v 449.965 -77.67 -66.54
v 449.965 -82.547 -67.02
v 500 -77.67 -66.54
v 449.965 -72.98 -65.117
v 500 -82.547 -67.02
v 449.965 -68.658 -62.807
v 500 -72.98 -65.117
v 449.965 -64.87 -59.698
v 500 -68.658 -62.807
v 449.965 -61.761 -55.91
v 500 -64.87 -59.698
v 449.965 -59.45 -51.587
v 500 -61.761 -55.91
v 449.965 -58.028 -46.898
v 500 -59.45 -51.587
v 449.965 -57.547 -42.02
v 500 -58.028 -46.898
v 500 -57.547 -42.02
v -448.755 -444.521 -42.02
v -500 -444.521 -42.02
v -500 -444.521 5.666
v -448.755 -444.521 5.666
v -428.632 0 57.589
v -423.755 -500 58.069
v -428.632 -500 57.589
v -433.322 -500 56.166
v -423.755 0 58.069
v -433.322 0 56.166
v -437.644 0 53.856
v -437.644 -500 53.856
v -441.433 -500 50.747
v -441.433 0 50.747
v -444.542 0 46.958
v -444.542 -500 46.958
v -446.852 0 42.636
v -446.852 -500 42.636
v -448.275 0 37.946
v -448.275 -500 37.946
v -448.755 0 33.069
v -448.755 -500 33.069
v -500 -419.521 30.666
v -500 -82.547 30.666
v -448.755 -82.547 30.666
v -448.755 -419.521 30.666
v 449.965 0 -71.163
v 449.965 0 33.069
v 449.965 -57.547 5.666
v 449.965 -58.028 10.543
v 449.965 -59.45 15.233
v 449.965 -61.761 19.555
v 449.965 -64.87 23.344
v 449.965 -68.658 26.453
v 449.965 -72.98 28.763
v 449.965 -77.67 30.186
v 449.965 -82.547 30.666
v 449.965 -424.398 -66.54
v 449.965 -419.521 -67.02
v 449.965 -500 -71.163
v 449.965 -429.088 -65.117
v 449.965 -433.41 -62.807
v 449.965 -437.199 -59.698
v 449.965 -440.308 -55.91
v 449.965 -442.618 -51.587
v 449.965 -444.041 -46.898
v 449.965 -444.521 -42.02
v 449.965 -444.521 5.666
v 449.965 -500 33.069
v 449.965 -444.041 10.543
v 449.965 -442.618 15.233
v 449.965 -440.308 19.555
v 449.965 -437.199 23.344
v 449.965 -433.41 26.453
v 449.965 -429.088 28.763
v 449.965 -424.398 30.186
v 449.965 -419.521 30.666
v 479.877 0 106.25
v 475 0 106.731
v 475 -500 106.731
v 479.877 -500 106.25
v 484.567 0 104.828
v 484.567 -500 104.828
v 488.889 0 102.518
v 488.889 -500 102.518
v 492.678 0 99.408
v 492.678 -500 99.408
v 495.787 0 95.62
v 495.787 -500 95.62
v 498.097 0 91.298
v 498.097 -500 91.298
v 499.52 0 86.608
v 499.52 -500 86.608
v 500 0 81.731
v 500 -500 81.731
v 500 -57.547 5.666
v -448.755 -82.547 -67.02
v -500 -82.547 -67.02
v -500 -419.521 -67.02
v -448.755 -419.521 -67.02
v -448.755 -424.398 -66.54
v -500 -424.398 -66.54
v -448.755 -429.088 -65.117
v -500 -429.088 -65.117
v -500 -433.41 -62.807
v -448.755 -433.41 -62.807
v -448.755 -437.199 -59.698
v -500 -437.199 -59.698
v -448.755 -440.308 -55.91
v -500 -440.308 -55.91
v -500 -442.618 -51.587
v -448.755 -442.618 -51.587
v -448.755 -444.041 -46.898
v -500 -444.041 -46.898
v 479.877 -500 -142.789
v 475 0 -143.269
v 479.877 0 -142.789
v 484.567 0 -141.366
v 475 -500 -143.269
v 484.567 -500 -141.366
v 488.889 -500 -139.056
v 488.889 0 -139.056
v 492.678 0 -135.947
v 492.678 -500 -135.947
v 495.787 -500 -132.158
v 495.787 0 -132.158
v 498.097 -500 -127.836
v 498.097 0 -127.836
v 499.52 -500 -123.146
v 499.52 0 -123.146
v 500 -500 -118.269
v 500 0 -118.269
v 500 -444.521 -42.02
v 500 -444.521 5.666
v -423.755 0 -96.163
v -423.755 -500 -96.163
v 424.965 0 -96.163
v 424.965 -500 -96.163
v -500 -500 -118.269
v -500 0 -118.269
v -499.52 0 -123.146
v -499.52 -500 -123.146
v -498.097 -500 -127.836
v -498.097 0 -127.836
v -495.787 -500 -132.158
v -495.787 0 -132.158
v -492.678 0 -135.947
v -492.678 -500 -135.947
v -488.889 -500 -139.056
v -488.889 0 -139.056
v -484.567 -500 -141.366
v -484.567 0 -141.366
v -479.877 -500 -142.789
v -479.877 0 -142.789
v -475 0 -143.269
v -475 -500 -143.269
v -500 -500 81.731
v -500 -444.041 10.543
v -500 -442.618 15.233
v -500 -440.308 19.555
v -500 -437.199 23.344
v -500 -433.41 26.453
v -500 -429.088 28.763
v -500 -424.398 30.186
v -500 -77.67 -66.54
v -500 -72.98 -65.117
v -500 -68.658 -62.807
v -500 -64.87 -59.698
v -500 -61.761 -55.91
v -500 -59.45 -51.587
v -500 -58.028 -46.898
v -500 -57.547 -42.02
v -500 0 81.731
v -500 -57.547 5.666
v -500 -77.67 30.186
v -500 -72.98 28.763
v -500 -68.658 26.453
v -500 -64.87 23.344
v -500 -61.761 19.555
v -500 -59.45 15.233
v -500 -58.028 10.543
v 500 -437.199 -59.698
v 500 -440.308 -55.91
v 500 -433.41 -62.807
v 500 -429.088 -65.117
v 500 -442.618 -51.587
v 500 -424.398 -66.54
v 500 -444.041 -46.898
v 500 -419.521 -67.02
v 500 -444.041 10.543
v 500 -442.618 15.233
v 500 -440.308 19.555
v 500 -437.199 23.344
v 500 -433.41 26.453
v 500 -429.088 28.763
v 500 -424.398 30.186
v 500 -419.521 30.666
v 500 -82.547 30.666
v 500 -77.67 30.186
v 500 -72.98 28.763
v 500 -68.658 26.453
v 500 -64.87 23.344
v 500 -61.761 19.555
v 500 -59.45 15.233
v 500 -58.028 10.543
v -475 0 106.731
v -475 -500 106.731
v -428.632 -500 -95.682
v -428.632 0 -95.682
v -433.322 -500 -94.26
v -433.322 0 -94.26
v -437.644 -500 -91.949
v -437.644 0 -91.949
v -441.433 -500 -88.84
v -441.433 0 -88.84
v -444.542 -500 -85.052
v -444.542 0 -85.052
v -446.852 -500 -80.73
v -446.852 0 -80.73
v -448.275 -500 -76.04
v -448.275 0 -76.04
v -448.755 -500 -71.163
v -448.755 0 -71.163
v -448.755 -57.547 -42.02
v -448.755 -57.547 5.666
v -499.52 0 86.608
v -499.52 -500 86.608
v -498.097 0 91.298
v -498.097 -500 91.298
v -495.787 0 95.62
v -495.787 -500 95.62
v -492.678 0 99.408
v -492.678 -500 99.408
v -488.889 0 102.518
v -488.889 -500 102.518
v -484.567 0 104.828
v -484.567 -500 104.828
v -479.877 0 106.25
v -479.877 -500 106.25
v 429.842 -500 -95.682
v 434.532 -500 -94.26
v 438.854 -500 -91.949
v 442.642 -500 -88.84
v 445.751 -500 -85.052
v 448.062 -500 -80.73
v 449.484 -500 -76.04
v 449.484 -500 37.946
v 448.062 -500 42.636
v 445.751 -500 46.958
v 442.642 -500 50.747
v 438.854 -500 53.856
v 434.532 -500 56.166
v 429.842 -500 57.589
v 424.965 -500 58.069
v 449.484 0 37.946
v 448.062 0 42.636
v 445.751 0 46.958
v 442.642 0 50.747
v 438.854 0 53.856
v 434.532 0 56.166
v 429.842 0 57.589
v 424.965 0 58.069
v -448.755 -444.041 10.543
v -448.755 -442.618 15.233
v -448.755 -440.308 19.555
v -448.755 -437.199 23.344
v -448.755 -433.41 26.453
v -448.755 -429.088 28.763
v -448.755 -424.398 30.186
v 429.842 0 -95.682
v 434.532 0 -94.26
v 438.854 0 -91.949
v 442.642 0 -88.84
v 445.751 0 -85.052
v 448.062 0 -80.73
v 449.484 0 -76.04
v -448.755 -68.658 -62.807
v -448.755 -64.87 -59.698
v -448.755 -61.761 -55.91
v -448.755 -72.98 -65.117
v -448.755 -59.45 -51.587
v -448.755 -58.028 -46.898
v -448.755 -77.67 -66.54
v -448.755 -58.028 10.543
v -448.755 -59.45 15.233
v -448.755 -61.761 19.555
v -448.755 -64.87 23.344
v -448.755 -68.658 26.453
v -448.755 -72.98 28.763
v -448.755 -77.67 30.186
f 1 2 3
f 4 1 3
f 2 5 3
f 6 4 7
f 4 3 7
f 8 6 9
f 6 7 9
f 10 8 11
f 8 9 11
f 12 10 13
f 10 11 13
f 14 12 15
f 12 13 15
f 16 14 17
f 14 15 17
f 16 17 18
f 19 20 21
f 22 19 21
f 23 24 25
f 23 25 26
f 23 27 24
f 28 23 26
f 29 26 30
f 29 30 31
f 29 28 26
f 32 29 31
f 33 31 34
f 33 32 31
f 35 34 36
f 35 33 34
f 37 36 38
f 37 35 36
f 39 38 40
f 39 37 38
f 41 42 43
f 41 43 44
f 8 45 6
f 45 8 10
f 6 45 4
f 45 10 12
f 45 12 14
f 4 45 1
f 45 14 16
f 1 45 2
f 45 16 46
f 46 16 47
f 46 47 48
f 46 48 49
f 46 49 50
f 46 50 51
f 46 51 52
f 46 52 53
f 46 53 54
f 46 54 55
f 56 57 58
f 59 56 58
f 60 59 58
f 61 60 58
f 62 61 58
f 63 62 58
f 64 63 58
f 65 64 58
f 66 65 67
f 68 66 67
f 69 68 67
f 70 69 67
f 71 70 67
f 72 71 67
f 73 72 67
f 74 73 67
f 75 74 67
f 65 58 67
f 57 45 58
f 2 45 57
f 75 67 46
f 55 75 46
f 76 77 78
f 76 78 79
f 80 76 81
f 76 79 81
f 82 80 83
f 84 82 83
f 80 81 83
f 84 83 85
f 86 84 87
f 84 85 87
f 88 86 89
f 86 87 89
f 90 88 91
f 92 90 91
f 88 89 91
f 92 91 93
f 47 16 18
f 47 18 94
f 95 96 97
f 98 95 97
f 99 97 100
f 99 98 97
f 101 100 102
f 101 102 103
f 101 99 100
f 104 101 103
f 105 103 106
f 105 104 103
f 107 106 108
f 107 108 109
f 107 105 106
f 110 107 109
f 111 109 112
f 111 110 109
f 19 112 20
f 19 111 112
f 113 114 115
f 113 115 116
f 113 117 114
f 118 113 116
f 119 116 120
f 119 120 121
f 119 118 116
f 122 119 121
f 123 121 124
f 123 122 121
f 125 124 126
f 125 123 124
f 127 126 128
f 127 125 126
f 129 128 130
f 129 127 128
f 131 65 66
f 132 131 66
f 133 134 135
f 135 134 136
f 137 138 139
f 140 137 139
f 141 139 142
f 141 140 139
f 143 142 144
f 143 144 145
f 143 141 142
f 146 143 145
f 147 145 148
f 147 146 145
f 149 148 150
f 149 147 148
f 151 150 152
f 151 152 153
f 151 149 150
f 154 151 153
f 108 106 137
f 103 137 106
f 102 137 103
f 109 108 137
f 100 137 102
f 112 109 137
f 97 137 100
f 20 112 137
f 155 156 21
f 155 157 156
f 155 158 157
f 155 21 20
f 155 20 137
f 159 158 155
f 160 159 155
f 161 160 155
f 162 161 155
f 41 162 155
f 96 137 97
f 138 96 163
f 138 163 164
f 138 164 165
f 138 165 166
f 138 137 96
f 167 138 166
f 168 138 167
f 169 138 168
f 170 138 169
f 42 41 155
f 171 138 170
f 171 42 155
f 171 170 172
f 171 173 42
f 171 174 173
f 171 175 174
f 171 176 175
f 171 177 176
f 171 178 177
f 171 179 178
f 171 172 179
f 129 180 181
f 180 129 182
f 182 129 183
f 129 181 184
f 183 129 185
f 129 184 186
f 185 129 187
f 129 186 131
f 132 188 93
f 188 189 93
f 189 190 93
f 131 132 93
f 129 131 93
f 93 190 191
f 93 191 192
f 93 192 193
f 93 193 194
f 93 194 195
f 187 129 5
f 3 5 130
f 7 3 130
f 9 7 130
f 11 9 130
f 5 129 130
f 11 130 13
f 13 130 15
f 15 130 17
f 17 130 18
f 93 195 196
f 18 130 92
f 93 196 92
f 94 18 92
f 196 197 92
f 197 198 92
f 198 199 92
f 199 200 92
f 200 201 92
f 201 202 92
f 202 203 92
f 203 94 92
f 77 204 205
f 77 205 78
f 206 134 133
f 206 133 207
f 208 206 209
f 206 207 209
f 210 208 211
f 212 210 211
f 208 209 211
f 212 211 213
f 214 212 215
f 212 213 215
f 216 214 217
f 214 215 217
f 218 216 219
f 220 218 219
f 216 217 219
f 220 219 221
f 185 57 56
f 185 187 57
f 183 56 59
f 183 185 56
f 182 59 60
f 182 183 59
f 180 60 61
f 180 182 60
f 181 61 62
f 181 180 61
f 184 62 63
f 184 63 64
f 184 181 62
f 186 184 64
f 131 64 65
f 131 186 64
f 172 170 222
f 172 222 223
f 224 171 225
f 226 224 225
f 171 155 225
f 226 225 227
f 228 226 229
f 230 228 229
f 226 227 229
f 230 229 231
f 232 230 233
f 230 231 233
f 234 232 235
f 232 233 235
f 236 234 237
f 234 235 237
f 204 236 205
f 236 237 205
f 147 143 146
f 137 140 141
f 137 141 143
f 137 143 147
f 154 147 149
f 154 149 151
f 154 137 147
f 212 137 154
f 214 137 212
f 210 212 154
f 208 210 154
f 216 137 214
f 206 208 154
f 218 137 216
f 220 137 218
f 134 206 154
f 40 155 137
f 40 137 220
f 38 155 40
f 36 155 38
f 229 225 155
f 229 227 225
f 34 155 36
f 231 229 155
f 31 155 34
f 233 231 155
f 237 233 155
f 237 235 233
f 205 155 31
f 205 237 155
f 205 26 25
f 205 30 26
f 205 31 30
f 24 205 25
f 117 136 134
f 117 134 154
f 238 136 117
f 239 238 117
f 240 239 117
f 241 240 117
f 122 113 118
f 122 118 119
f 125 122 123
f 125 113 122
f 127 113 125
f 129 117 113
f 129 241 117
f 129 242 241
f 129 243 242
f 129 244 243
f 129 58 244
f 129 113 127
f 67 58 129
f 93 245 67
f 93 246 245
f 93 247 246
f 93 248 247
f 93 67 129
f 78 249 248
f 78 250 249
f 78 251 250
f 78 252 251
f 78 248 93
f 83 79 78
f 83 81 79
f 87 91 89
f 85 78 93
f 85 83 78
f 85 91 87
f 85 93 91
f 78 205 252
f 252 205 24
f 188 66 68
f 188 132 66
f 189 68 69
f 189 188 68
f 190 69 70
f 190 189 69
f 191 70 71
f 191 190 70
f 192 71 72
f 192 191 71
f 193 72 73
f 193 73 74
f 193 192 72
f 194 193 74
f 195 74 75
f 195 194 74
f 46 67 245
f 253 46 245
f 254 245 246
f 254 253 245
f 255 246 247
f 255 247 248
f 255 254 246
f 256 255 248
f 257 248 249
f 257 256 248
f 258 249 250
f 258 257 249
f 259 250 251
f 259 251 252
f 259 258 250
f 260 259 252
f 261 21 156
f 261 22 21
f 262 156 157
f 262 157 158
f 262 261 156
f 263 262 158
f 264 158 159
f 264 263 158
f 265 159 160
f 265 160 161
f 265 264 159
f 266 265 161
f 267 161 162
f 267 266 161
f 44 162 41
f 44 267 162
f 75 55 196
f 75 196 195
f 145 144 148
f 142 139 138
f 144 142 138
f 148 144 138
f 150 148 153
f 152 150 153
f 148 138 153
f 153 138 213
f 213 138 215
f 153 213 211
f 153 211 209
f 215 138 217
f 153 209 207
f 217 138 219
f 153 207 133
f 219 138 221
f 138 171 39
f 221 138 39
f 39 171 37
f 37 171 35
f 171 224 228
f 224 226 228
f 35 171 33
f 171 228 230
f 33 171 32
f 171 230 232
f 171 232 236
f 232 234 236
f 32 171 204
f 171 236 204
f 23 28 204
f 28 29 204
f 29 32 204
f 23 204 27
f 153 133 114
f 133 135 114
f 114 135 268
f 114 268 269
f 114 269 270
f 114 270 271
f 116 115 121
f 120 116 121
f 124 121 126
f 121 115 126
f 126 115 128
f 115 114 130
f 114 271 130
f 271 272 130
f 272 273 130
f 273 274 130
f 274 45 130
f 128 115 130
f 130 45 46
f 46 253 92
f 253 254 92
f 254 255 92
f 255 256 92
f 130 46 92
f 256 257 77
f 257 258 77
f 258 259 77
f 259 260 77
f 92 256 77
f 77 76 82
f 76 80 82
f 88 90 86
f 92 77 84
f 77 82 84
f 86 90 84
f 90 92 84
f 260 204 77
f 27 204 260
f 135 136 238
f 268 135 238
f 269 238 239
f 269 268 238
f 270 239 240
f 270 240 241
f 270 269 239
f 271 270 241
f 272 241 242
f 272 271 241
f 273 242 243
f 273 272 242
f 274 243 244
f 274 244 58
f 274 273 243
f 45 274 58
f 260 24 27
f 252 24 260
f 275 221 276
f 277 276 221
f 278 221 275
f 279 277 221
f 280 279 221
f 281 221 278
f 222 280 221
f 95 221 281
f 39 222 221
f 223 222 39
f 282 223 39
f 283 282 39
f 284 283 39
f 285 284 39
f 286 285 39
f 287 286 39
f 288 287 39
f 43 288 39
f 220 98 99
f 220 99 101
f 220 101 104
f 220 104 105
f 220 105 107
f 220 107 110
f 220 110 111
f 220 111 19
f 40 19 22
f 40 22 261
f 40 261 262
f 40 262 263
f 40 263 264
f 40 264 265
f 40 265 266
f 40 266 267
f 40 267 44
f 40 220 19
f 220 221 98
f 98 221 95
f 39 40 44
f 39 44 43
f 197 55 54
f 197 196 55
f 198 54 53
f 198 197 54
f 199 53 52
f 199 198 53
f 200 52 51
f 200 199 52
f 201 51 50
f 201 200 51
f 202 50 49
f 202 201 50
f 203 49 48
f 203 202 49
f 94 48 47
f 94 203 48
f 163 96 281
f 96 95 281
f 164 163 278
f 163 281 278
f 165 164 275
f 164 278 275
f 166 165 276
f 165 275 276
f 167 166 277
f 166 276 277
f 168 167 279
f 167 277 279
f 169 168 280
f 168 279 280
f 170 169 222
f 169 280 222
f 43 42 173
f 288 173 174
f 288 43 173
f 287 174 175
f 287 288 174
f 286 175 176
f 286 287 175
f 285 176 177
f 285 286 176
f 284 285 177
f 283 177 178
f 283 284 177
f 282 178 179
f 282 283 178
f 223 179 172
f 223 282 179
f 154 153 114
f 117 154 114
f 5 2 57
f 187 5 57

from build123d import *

# Parameters (mm, degrees)
F0_W     = 2000
F0_H     = 500
F1_DEPTH = 1000
F2_W     = 1797.4397540092
F2_H     = 308.4638491273
F3_DEPTH = 1000.001
F4_R     = 50
F5_W     = 773.9472016692
F5_H     = 195.3730471432
F6_DEPTH = 2000.001
F7_R     = 50
F8_SCALE = 0.5


with BuildPart() as f1:
    # F0 (on Front) → F1 (new body)
    with BuildSketch(Plane.XZ):
        with Locations((0, -36.5384618746)):
            Rectangle(F0_W, F0_H)
    extrude(amount=F1_DEPTH)

    # F2 (on face) → F3 (cut, through all)
    with BuildSketch(Plane.XZ.offset(1000)):
        with Locations((1.2095868587, -38.0935780704)):
            Rectangle(F2_W, F2_H)
    extrude(amount=-F3_DEPTH, mode=Mode.SUBTRACT)

    # F4
    f4_edges = [f1.edges().sort_by_distance(p)[0] for p in [
        (1000, -500, 213.461538),
        (1000, -500, -286.538462),
        (-1000, -500, 213.461538),
        (-1000, -500, -286.538462),
        (-897.51029, -500, 116.138346),
        (-897.51029, -500, -192.325503),
        (899.929464, -500, 116.138346),
        (899.929464, -500, -192.325503),
    ]]
    fillet(f4_edges, radius=F4_R)

    # F5 (on face) → F6 (cut, through all)
    with BuildSketch(Plane(origin=(-1000, 0, 0), x_dir=(0, -1, 0), z_dir=(-1, 0, 0))):
        with Locations((502.0684786141, -36.3542791456)):
            Rectangle(F5_W, F5_H)
    extrude(amount=-F6_DEPTH, mode=Mode.SUBTRACT)

    # F7
    f7_edges = [f1.edges().sort_by_distance(p)[0] for p in [
        (949.964732, -115.094878, 61.332244),
        (949.964732, -889.042079, 61.332244),
        (949.964732, -115.094878, -134.040803),
        (949.964732, -889.042079, -134.040803),
        (-948.755145, -889.042079, -134.040803),
        (-948.755145, -889.042079, 61.332244),
        (-948.755145, -115.094878, 61.332244),
        (-948.755145, -115.094878, -134.040803),
    ]]
    fillet(f7_edges, radius=F7_R)


with BuildPart() as f1_1:
    # F8: moved
    add(f1.part.scale(F8_SCALE))


solid = f1_1.part
